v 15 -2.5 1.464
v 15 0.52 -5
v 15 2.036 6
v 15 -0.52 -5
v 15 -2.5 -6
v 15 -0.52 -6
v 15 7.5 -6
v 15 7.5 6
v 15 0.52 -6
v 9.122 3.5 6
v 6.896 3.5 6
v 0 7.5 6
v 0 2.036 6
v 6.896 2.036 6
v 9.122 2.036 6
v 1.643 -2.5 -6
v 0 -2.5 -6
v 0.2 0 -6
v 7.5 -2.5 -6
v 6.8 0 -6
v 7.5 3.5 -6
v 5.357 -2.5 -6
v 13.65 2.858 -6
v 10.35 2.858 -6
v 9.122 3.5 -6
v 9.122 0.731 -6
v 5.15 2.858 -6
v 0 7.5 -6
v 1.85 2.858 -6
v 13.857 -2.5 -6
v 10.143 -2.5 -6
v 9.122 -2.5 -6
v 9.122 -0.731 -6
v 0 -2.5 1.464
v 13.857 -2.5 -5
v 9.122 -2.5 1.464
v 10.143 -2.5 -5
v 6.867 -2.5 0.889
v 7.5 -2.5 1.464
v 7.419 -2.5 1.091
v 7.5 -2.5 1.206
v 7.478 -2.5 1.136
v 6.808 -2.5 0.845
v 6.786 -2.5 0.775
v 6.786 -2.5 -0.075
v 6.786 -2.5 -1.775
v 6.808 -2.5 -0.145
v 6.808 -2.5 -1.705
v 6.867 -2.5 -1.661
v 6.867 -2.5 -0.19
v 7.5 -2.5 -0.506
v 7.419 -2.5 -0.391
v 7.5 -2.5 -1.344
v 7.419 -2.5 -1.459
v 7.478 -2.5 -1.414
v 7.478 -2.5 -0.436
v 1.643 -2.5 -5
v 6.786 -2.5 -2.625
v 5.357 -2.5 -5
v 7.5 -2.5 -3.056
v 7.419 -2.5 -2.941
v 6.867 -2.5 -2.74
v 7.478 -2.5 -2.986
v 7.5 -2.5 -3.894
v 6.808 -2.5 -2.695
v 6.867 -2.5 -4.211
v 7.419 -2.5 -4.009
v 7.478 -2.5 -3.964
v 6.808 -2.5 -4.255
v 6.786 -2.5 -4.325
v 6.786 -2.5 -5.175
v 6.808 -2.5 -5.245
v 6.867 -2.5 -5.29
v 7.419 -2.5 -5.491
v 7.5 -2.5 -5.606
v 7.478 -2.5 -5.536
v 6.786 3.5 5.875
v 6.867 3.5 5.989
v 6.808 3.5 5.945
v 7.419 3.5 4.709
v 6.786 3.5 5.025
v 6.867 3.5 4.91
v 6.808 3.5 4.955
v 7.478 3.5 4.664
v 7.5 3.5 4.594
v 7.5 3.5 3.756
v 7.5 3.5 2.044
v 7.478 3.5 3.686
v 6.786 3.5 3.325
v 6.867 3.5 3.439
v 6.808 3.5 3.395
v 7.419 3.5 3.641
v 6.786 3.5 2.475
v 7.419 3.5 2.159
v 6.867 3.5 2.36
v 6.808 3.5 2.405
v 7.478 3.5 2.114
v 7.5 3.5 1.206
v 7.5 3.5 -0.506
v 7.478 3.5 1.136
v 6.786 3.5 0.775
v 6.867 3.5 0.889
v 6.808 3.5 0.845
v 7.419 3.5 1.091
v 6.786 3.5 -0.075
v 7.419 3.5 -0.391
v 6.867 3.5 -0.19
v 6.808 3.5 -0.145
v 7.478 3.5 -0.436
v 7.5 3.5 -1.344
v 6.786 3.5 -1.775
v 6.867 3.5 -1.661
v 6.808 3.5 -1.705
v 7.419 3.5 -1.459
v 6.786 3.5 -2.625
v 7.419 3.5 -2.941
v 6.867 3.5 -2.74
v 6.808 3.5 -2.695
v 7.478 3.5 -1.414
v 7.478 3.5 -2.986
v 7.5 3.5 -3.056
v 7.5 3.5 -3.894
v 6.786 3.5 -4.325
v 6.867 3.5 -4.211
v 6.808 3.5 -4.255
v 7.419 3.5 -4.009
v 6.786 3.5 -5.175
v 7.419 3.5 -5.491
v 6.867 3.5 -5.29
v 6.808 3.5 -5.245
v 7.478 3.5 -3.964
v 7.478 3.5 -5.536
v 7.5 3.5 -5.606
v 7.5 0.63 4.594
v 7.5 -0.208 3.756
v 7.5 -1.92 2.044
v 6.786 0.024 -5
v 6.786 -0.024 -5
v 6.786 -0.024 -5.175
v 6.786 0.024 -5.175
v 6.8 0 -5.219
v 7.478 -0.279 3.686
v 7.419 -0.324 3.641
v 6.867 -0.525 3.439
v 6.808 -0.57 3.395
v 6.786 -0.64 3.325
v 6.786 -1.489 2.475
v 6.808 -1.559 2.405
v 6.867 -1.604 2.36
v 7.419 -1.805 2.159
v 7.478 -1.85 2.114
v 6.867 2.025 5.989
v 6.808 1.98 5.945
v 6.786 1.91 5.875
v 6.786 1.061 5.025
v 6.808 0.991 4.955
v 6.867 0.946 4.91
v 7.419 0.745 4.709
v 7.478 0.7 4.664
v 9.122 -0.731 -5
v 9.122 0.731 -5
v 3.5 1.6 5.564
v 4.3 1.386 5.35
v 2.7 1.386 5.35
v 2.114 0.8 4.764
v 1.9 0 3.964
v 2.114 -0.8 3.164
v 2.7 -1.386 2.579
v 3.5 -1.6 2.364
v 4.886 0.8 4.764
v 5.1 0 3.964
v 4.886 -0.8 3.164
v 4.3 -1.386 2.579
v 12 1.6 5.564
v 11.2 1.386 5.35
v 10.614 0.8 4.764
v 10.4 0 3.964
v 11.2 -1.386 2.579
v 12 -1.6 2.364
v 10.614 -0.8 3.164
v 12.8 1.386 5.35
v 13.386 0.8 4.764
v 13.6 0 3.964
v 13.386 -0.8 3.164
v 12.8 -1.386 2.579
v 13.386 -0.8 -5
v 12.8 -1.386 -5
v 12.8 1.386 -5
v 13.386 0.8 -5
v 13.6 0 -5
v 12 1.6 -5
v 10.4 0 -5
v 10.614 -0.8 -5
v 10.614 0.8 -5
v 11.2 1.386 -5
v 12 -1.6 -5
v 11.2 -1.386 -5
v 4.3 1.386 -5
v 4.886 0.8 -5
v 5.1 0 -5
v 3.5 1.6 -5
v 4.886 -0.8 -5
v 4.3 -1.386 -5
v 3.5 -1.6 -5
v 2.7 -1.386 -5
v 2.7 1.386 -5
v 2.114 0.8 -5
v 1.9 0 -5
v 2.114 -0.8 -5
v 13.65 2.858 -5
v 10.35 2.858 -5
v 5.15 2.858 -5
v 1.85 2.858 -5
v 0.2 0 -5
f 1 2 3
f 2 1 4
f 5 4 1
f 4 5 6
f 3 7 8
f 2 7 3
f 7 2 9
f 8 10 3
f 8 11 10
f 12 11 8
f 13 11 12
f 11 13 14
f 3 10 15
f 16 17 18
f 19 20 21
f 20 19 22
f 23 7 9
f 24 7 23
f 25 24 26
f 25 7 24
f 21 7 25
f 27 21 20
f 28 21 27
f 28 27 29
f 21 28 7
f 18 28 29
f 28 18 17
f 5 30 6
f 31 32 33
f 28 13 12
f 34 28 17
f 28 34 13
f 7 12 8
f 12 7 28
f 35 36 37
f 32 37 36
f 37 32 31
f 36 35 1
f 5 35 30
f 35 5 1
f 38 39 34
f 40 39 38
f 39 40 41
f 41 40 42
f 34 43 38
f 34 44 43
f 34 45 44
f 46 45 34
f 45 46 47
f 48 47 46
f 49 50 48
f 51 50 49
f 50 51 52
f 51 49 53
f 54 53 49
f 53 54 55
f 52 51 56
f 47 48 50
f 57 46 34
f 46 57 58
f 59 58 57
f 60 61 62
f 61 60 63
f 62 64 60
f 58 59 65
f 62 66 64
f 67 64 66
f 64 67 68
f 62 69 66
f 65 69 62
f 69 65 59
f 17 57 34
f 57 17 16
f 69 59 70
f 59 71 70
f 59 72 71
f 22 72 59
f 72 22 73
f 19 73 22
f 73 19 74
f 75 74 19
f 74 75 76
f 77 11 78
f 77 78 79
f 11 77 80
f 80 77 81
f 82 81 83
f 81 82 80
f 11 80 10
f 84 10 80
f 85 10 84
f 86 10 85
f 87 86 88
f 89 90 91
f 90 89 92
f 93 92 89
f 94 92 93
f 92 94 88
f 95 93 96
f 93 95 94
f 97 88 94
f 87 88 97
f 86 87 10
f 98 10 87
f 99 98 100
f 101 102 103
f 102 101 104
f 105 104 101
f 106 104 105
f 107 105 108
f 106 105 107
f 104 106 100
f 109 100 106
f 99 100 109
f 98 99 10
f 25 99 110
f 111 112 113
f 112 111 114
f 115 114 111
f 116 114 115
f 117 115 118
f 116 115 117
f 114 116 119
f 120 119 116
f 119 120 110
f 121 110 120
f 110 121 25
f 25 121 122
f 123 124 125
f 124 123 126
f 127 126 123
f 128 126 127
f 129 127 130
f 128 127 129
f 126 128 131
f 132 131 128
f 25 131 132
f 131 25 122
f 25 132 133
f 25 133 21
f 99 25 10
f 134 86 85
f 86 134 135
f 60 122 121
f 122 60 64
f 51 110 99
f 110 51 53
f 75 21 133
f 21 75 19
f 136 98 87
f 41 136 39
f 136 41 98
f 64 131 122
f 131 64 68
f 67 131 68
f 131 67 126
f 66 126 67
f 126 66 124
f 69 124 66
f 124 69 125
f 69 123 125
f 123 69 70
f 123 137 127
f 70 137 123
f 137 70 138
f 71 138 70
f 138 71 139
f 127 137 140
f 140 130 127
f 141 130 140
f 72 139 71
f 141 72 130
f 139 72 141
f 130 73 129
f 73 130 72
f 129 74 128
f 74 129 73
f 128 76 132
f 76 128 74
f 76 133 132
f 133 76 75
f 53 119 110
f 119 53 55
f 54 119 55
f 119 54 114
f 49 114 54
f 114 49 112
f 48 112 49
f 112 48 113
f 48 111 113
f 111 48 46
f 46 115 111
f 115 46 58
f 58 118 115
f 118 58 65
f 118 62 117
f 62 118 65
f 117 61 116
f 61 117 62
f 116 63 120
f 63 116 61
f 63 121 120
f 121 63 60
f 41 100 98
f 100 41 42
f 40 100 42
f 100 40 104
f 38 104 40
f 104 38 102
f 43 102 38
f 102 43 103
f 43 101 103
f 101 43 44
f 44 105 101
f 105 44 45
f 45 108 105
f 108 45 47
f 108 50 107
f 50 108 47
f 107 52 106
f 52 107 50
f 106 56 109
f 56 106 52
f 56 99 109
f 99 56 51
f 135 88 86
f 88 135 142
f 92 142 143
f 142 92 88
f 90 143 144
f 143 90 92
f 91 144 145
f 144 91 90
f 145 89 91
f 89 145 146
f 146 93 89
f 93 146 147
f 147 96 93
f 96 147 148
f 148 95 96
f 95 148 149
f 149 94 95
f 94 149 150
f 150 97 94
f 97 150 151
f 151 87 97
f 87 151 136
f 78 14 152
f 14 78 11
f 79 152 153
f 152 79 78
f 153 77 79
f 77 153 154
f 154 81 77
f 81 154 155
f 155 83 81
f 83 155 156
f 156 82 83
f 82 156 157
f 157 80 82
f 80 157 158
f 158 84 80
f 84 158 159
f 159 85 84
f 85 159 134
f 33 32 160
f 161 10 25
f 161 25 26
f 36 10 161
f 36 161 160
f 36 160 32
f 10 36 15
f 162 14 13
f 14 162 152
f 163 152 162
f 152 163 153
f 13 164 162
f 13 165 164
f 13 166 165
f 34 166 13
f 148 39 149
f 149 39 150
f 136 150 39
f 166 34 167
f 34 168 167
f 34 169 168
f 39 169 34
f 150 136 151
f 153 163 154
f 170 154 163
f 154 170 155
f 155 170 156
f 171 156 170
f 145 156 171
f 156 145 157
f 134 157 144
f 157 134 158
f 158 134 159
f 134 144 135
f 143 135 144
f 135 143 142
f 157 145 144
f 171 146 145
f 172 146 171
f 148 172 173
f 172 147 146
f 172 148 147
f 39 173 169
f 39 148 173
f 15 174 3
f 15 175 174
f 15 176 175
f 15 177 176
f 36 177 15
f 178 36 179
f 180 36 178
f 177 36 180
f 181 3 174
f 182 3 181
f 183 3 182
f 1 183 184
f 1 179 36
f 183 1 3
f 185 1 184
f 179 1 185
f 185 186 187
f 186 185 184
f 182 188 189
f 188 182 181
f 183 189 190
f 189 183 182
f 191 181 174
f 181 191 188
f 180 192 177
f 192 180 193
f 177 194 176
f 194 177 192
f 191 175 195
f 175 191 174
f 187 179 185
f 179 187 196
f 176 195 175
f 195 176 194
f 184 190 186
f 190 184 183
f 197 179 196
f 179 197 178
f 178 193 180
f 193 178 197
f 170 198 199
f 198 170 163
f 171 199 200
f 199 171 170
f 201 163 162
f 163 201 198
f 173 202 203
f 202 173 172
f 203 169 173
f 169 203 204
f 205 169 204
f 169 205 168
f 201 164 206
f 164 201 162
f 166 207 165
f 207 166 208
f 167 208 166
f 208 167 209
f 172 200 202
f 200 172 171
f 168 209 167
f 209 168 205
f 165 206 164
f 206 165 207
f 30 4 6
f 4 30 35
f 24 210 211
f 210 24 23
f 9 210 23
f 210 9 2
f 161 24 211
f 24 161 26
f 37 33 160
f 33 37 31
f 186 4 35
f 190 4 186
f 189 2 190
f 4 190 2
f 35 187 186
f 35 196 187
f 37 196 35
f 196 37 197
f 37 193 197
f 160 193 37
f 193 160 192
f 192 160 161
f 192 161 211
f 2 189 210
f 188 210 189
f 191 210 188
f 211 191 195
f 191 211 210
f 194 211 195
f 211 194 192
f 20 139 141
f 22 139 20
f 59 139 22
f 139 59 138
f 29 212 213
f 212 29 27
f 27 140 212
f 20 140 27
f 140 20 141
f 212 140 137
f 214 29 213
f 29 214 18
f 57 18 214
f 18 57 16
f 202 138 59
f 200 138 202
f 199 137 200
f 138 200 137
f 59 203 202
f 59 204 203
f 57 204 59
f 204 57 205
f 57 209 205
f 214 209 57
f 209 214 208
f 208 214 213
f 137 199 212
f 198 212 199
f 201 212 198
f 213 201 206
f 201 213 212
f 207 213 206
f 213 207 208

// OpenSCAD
// file: linear_bearing.scad
// Open SCAD model of linear Bearing LM-8-UU & KB-12-WW

//     LM-8-UU        KB-12-WW
//	D_Int =  8.0	D_Int = 12.0
//	D_Ext = 15.0	D_Ext = 22.0
//	D_1   = 14.3	D_1   = 21.0
//	L     = 24.0	L     = 32.0
//	W     =  1.1	W     =  1.3
//	B     = 17.5	B     = 22.9



module groove(d1, d2, w) {
	difference() {
		cylinder(r=d1/2+1, h=w, center=true);
		cylinder(r=d2/2  , h=w, center=true);
	}
}

module lb(D_Int=8, D_Ext=15, D_1=14.3, L=24, W=1.1, B=17.5) {
	chamf = D_Ext - D_1;
	color([0.8, 0.8, 0.9]) {
	difference() {
		hull() {
			cylinder(r=D_Ext/2, h=L-chamf, center=true);
			cylinder(r=D_1  /2, h=L      , center=true);
		}
		cylinder(r=D_Int/2, h=L+2    , center=true);
		translate([0, 0, B/2-W/2]) groove(D_Ext, D_1, W);
		translate([0, 0,-B/2+W/2]) groove(D_Ext, D_1, W);
		translate([0, 0,     L/2]) groove(D_Ext-(D_Ext-D_Int)/2, 1, W);
		translate([0, 0,    -L/2]) groove(D_Ext-(D_Ext-D_Int)/2, 1, W);
	}
	}
}


module linear_bearing(linear_bearing_type) {
	if(linear_bearing_type == "LM-8-UU") {   //LM-8-UU
		lb(D_Int=8, D_Ext=15, D_1=14.3, L=24, W=1.1, B=17.5);
	}
	else {
		if(linear_bearing_type == "KB-12-WW") {   //KB-12-WW
			lb(D_Int=12, D_Ext=22, D_1=21, L=32, W=1.3, B=22.9);
		}
	}
}


translate([0,  0, 12]) linear_bearing("LM-8-UU" );
translate([0, 20, 16]) linear_bearing("KB-12-WW");
// file: carrello.scad
// Enlarged Rostock Motor End inspired from Jcrocholl modified by Kolergy to:
//    - Take 12x1000mm smooth rods and KB-12-WW Linear Bearings
//    - Should clip the bearings (Not yet tested)
//    - 0.10° bearing holder angles to compensate play
//    - Changed droove to improve fabricability
//    - T2.5 self locking belt mount based on belt_coupler_v6 from Okatake

 


use <linear_bearing.scad>
use <belt_coupler_v6_Mod.scad>

$fn=75;
// Rostock Motor End from Jcrocholl modified by Kolergy to:
//    - Take 12x1000mm smooth rods and KB-12-WW Linear Bearings
//    - Increased base height to locate electronics below the base
//    - Stand on three feets


motor_end_height      =  64;  // Was 44
idler_end_height      =  28;
carriage_height       =  32; // Adapted to cover full length +2 of the Linear bearing
platform_thickness    =   8;
bed_thickness         =  12;
pcb_thickness         =   2;
smooth_rod_length     =1000;
platform_hinge_offset =  33;
carriage_hinge_offset =  24;
tower_radius          = 300;
rod_length            = tower_radius * 1.44;

H  = carriage_height;
W  = 60;
d  = 22;
th = 4;

width = 90;                  // Caridge widith
//height = carriage_height;

offset = 25;
cutout = 13;                 // Universal joint cutout
middle = 2*offset - width/2;


//% translate([ W/2, 0, 0]) linear_bearing("KB-12-WW");
//% translate([-W/2, 0, 0]) linear_bearing("KB-12-WW");

module magnete() {
rotate([-135])
difference() {
	translate([0,0,0]) cylinder(r=13, h=9, center=false);
	union(){
	translate([0,0,3]) cylinder(r=10.4, h=7, center=true);
	translate([0,0,0]) cylinder(r=5, h=99, center=false);
}
} 
}



module conical_groove(d1, d2, w) {
	difference() {
		translate([0, 0, -w  ]) cylinder(r =d1/2+0.1,       h=w*2,     center=true);
		translate([0, 0, -w/2]) cylinder(r1=d2/2  ,r2=d1/2, h=w+0.1,   center=true);
		translate([0, 0, -w  ]) cylinder(r =d2/2,           h=w*2+0.1, center=true);
	}
}

module groove(d1, d2, w) {
		difference() {
			cylinder(r=d1/2+1, h=w, center=true);
			cylinder(r=d2/2  , h=w, center=true);
			translate([0, 0, w/2]) cylinder(r1=d2/2  ,r2=d1/2, h=w/1.5,   center=true);
		}
}

module LB_holder(d, w, H, dH) {
	difference() {
		union() {
			difference() {
				translate([ w,   0, 0]) cylinder(r=d/2+th, h=H+dH,   center=true);
				translate([ w,   0, 0]) cylinder(r=d/2,    h=H+dH+2, center=true);
			}
			translate([ w,  0, -H/2])  conical_groove(d, d-2, dH/4);
			translate([ w,  0,  H/2])  rotate([ 180,  0,  0]) conical_groove(d, d-2, dH/4);
		}
		//translate([ w,  0,  H/2-5])  groove(d+2*th+1, d+2*th-4, 3);
		//translate([ w,  0,  -H/2+5])  groove(d+2*th+1, d+2*th-4, 3);
		translate([ w, d/2+3, 0]) cube([d+2*th+2, d, H+dH+2], center=true);
	}
}

module parallel_joints(reinforced) {
  difference() {
    union() {
      intersection() {   // UJoint Arms
        cube([width, 20, 8], center=true);
        rotate([0, 90, 0]) cylinder(r=4.7, h=width, center=true);
      }
      intersection() {
        translate([0, 18, 4]) rotate([45, 0, 0])
          cube([width, reinforced+13, reinforced+13], center=true);
        translate([0, 0, 20]) cube([width, 35+5, 40+8], center=true);
      }
      translate([0, 8, 0]) cube([width, 16, 8], center=true);
    }
    //rotate([0, 90, 0]) cylinder(r=1.55, h=80, center=true, $fn=12);

    for (x = [-offset, offset]) {
      translate([x*2.2, 14, 0])
        cylinder(r=14, h=100, center=true, $fn=24);
      translate([(x*2.2), -4.5, 0])
        cube([12, 30, 100], center=true);
      //translate([x, 0, 0]) rotate([0, 90, 0]) rotate([0, 0, 30])
        //cylinder(r=3.3, h=17, center=true, $fn=6);
    }
    translate([0, -22, 0]) resize([15,75,0]) cylinder(r=20, h=100, center=true);
  }
}

module belt_mount() {
  difference() {
    union() {
      difference() {
        translate([8, 0, 0]) cube([4, 14, H+4], center=true);
        for (z = [-3.5, 3.5])
          translate([8, 0, z]) cube([5, 14, 3], center=true);
      }
      for (y = [-2.5, 1.5, 6.5]) {
        translate([8, y, 0]) cube([4, 1.2, H+4], center=true);
      }
    }
  }
}

module belt_mount2() {
        translate([8, 8, 0]) 
	difference() {
		union() {
			rotate([90, -90, 0]) coupler();
			translate([0, -17, 0]) cylinder(r=5, h=H+th, center=true, $fn=12);
		}
      	for (y = [-0.7, 0.7]) {
        		translate([0, -3, y*H/2]) rotate([0, 90, 0]) cylinder(r=1.6, h=5, center=true, $fn=12);
		}
	}
}

module belt_mount3() {
	difference(){
		union(){
			translate([9, -5.25, 0]) cube([17, 4.5, H+th], center=true);
			translate([9, 0, (H+th)/2-7]) 
			difference() {
				cube([17, 7, 14], center=true);
				translate([0, 2, -5]) rotate([-45, 0,  0]) cube([18, 6, 12], center=true);
			}
		translate([9, 0, -(H+th)/2+2.]) cube([17, 6, 4], center=true);
		}
	translate([12.0,  0, 0]) cylinder(r=1.6, h=H+th+2, center=true, $fn=12);
	translate([ 3.5,  0, 0]) cylinder(r=1.6, h=H+th+2, center=true, $fn=12);
	translate([ 7.8, 14.35, -(H+th)/2+1]) rotate([90, -90, 0]) belt();
	translate([ 8.2, 13.85, -(H+th)/2+1]) rotate([90, -90, 0]) belt(); // Slightly enlarge the gap of the belt
	translate([8, 0.5, -(H+th)/2+2.5]) cube([3, 6, 6], center=true);
	}
}
module carriage() {
	difference() {
		union() {
			difference() {
				union() {
					translate([ 0,  -th-7, 0]) cube([W, 8, H+4], center=true);
					translate([ 0,  -28,  -H/2+2])  parallel_joints(16);
				}
				translate([ W/2,   0, 0]) cylinder(r=d/2+1,    h=H+4+2, center=true);
				translate([-W/2,   0, 0]) cylinder(r=d/2+1,    h=H+4+2, center=true);
			}
			// 0.10° rotation to compensate play on different axis
			rotate([0, 0.10,  0]) LB_holder(d,  W/2, H, 4); 
			rotate([0.10,  0, 0]) LB_holder(d, -W/2, H, 4);
    			belt_mount3();
		}
		// Grooves
		translate([ W/2,  0,  H/2-5])  groove(d+2*5+1, d+2*th-4, 4);
		translate([ W/2,  0, -H/2+5])  groove(d+2*5+1, d+2*th-4, 4);
		translate([-W/2,  0,  H/2-5])  groove(d+2*5+1, d+2*th-4, 4);
		translate([-W/2,  0, -H/2+5])  groove(d+2*5+1, d+2*th-4, 4);
		// Screw hole for adjustable top endstop.
		translate([15, -17, -H/2+4]) cylinder(r=1.5, h=40, center=true, $fn=12);
	}

}
//translate([ w,  0, 0]) cylinder(r=11  , h=H+dH+2, center=true);
//import("/home/andrea/git/RAM/parti/carrello.stl");
difference(){
	union(){
		intersection(){
			carriage();
			union() {
				translate([-27,-25,0]) cylinder(r=16, h=40, center=true);
				translate([27,-25,0]) cylinder(r=16, h=40, center=true);
				cube([100, 40, 100], center=true);
				translate([0,0,-13]) cube([50, 100, 10], center=true);
			}
		}
		translate([-27,-30,0]) magnete();
		translate([27,-30,0]) magnete();
	}
translate([15, -17, 2]) cylinder(r=3.2, h=8, center=true, $fn=6);
}
//#translate([-27,-30,0])cube([54,2,2]);

// Uncomment the following lines to check endstop alignment.
// use <idler_end.scad>;
// translate([0, 0, -20]) rotate([180, 0, 0]) idler_end();
// file: belt_coupler_v6_Mod.scad
// Rostock Motor End from Jcrocholl modified by Kolergy to:
//    - Take 12x1000mm smooth rods and KB-12-WW Linear Bearings
//    - Increased base height to locate electronics below the base
//    - Stand on three feets


motor_end_height      =  64;  // Was 44
idler_end_height      =  28;
carriage_height       =  32; // Adapted to cover full length +2 of the Linear bearing
platform_thickness    =   8;
bed_thickness         =  12;
pcb_thickness         =   2;
smooth_rod_length     =1000;
platform_hinge_offset =  33;
carriage_hinge_offset =  22;
tower_radius          = 300;
rod_length            = tower_radius * 1.44;


coupler_w = carriage_height+4;
coupler_h = 4.5;
coupler_d = 15;

belt_w = 15.5;
belt_n = 16;
belt_margin = 0.50;

coupler();

// coupler
module coupler() {
	difference(){
		translate([0,-0.20,-coupler_d/2+belt_w])cube([coupler_w,coupler_h,coupler_d],center=true);
		//for (axis_x = [-1:2:1]) {
			translate([-20,0,-0.01])
				scale(1.02)belt_length(profile = "T2.5", belt_width = belt_w+1, n = belt_n);
		//}
	}
}

module belt() {
	scale(1.02)belt_length(profile = "T2.5", belt_width = belt_w+1, n = belt_n);
}

// belt
//for (axis_x = [-1:2:1]) {
//	translate([2.00*belt_n*axis_x-11.25,0,-0.01])
//		%scale(1.02)belt_length(profile = "T2.5", belt_width = belt_w+1, n = belt_n);
//}

//================================================
// Module Section
//================================================
//Outer Module
module belt_length(profile = "T2.5", belt_width = 6, n = 10)
{

			if ( profile == "T2.5" ) 
				{ 
					_belt_length(
						profile=profile, 
						n = n, 
						belt_width = belt_width,
						tooth_pitch = 2.5,
						backing_thickness = 0.6 + belt_margin
						);
				}
			if ( profile == "T5" ) 
				{ 
					_belt_length(
						profile=profile, 
						n = n, 
						belt_width = belt_width,
						tooth_pitch = 5,
						backing_thickness = 1 + belt_margin
						);
				}
			if ( profile == "T10" ) 
				{ 
					_belt_length(
						profile=profile, 
						n = n, 
						belt_width = belt_width,
						tooth_pitch = 10,
						backing_thickness = 2 + belt_margin
						);
				}
			if ( profile == "MXL" ) 
				{ 
					_belt_length(
						profile=profile, 
						n = n, 
						belt_width = belt_width,
						tooth_pitch = 2.032,
						backing_thickness = 0.64 + belt_margin
						);
				}


}

//inner module
module _belt_length(profile = "T2.5", n = 10, belt_width = 5, tooth_pitch = 2.5, backing_thickness = 0.6)
{

for( i = [0:n])
	{
		union(){

			if ( profile == "T2.5" ) { translate([tooth_pitch*i,0,0])T2_5(width = belt_width);}
			if ( profile == "T5" ) { translate([tooth_pitch*i,0,0])T5(width = belt_width);}
			if ( profile == "T10" ) { translate([tooth_pitch*i,0,0])T10(width = belt_width);}
			if ( profile == "MXL" ) { translate([tooth_pitch*i,0,0])MXL(width = belt_width);}
			translate([(tooth_pitch*i)-(tooth_pitch/2),-backing_thickness,0])cube([tooth_pitch,backing_thickness,belt_width]);
		}
	}
}

//Tooth Form modules - Taken from http://www.thingiverse.com/thing:1662
module T2_5(width = 2)
	{
	linear_extrude(height=width) polygon([[-0.839258,-0.5],[-0.839258,0],[-0.770246,0.021652],[-0.726369,0.079022],[-0.529167,0.620889],[-0.485025,0.67826],[-0.416278,0.699911],[0.416278,0.699911],[0.484849,0.67826],[0.528814,0.620889],[0.726369,0.079022],[0.770114,0.021652],[0.839258,0],[0.839258,-0.5]]);
	}

module T5(width = 2)
	{
	linear_extrude(height=width) polygon([[-1.632126,-0.5],[-1.632126,0],[-1.568549,0.004939],[-1.507539,0.019367],[-1.450023,0.042686],[-1.396912,0.074224],[-1.349125,0.113379],[-1.307581,0.159508],[-1.273186,0.211991],[-1.246868,0.270192],[-1.009802,0.920362],[-0.983414,0.978433],[-0.949018,1.030788],[-0.907524,1.076798],[-0.859829,1.115847],[-0.80682,1.147314],[-0.749402,1.170562],[-0.688471,1.184956],[-0.624921,1.189895],[0.624971,1.189895],[0.688622,1.184956],[0.749607,1.170562],[0.807043,1.147314],[0.860055,1.115847],[0.907754,1.076798],[0.949269,1.030788],[0.9837,0.978433],[1.010193,0.920362],[1.246907,0.270192],[1.273295,0.211991],[1.307726,0.159508],[1.349276,0.113379],[1.397039,0.074224],[1.450111,0.042686],[1.507589,0.019367],[1.568563,0.004939],[1.632126,0],[1.632126,-0.5]]);
	}

module T10(width = 2)
	{
	linear_extrude(height=width) polygon([[-3.06511,-1],[-3.06511,0],[-2.971998,0.007239],[-2.882718,0.028344],[-2.79859,0.062396],[-2.720931,0.108479],[-2.651061,0.165675],[-2.590298,0.233065],[-2.539962,0.309732],[-2.501371,0.394759],[-1.879071,2.105025],[-1.840363,2.190052],[-1.789939,2.266719],[-1.729114,2.334109],[-1.659202,2.391304],[-1.581518,2.437387],[-1.497376,2.47144],[-1.408092,2.492545],[-1.314979,2.499784],[1.314979,2.499784],[1.408091,2.492545],[1.497371,2.47144],[1.581499,2.437387],[1.659158,2.391304],[1.729028,2.334109],[1.789791,2.266719],[1.840127,2.190052],[1.878718,2.105025],[2.501018,0.394759],[2.539726,0.309732],[2.59015,0.233065],[2.650975,0.165675],[2.720887,0.108479],[2.798571,0.062396],[2.882713,0.028344],[2.971997,0.007239],[3.06511,0],[3.06511,-1]]);
	}

module MXL(width = 2)
	{
	linear_extrude(height=width) polygon([[-0.660421,-0.5],[-0.660421,0],[-0.621898,0.006033],[-0.587714,0.023037],[-0.560056,0.049424],[-0.541182,0.083609],[-0.417357,0.424392],[-0.398413,0.458752],[-0.370649,0.48514],[-0.336324,0.502074],[-0.297744,0.508035],[0.297744,0.508035],[0.336268,0.502074],[0.370452,0.48514],[0.39811,0.458752],[0.416983,0.424392],[0.540808,0.083609],[0.559752,0.049424],[0.587516,0.023037],[0.621841,0.006033],[0.660421,0],[0.660421,-0.5]]);
	}
// main file
// Enlarged Rostock Belt tensioner
//    - T2.5 self locking belt geometry based on belt_coupler_v6 from Okatake


// Rostock Motor End from Jcrocholl modified by Kolergy to:
//    - Take 12x1000mm smooth rods and KB-12-WW Linear Bearings
//    - Increased base height to locate electronics below the base
//    - Stand on three feets
use <belt_coupler_v6_Mod.scad>
use <carrello.scad>

motor_end_height      =  64;  // Was 44
idler_end_height      =  28;
carriage_height       =  32; // Adapted to cover full length +2 of the Linear bearing
platform_thickness    =   8;
bed_thickness         =  12;
pcb_thickness         =   2;
smooth_rod_length     =1000;
platform_hinge_offset =  33;
carriage_hinge_offset =  22;
tower_radius          = 300;
rod_length            = tower_radius * 1.44;

H  = carriage_height;
th = 4;

//%carriage();

	difference() {
union(){
	translate([7.5, 5., 0]) cube([15, 5., 12], center=true);
		translate([7.5, 1, 0]) cube([15, 7, 12], center=true);
}
		translate([8, 0, 7.5]) rotate([-45, 0,  0]) cube([17, 5, 15], center=true);
		translate([ 7.5, 3.5, -(H+th)/2+0.5]) rotate([90, -90, 0]) belt();
		translate([ 8.0, 3.5, -(H+th)/2+0.6]) rotate([90, -90, 0]) belt(); // Slightly enlarge the gap of the belt
		translate([12, 0, 0]) cylinder(r=1.6, h=H+th+2, center=true, $fn=12);
		translate([ 3.5, 0, 0]) cylinder(r=1.6, h=H+th+2, center=true, $fn=12);
		translate([12, 0, -7]) cylinder(r=3.3, h=4, center=true, $fn=6);
		translate([ 3.5, 0, -7]) cylinder(r=3.3, h=4, center=true, $fn=6);
	
}
